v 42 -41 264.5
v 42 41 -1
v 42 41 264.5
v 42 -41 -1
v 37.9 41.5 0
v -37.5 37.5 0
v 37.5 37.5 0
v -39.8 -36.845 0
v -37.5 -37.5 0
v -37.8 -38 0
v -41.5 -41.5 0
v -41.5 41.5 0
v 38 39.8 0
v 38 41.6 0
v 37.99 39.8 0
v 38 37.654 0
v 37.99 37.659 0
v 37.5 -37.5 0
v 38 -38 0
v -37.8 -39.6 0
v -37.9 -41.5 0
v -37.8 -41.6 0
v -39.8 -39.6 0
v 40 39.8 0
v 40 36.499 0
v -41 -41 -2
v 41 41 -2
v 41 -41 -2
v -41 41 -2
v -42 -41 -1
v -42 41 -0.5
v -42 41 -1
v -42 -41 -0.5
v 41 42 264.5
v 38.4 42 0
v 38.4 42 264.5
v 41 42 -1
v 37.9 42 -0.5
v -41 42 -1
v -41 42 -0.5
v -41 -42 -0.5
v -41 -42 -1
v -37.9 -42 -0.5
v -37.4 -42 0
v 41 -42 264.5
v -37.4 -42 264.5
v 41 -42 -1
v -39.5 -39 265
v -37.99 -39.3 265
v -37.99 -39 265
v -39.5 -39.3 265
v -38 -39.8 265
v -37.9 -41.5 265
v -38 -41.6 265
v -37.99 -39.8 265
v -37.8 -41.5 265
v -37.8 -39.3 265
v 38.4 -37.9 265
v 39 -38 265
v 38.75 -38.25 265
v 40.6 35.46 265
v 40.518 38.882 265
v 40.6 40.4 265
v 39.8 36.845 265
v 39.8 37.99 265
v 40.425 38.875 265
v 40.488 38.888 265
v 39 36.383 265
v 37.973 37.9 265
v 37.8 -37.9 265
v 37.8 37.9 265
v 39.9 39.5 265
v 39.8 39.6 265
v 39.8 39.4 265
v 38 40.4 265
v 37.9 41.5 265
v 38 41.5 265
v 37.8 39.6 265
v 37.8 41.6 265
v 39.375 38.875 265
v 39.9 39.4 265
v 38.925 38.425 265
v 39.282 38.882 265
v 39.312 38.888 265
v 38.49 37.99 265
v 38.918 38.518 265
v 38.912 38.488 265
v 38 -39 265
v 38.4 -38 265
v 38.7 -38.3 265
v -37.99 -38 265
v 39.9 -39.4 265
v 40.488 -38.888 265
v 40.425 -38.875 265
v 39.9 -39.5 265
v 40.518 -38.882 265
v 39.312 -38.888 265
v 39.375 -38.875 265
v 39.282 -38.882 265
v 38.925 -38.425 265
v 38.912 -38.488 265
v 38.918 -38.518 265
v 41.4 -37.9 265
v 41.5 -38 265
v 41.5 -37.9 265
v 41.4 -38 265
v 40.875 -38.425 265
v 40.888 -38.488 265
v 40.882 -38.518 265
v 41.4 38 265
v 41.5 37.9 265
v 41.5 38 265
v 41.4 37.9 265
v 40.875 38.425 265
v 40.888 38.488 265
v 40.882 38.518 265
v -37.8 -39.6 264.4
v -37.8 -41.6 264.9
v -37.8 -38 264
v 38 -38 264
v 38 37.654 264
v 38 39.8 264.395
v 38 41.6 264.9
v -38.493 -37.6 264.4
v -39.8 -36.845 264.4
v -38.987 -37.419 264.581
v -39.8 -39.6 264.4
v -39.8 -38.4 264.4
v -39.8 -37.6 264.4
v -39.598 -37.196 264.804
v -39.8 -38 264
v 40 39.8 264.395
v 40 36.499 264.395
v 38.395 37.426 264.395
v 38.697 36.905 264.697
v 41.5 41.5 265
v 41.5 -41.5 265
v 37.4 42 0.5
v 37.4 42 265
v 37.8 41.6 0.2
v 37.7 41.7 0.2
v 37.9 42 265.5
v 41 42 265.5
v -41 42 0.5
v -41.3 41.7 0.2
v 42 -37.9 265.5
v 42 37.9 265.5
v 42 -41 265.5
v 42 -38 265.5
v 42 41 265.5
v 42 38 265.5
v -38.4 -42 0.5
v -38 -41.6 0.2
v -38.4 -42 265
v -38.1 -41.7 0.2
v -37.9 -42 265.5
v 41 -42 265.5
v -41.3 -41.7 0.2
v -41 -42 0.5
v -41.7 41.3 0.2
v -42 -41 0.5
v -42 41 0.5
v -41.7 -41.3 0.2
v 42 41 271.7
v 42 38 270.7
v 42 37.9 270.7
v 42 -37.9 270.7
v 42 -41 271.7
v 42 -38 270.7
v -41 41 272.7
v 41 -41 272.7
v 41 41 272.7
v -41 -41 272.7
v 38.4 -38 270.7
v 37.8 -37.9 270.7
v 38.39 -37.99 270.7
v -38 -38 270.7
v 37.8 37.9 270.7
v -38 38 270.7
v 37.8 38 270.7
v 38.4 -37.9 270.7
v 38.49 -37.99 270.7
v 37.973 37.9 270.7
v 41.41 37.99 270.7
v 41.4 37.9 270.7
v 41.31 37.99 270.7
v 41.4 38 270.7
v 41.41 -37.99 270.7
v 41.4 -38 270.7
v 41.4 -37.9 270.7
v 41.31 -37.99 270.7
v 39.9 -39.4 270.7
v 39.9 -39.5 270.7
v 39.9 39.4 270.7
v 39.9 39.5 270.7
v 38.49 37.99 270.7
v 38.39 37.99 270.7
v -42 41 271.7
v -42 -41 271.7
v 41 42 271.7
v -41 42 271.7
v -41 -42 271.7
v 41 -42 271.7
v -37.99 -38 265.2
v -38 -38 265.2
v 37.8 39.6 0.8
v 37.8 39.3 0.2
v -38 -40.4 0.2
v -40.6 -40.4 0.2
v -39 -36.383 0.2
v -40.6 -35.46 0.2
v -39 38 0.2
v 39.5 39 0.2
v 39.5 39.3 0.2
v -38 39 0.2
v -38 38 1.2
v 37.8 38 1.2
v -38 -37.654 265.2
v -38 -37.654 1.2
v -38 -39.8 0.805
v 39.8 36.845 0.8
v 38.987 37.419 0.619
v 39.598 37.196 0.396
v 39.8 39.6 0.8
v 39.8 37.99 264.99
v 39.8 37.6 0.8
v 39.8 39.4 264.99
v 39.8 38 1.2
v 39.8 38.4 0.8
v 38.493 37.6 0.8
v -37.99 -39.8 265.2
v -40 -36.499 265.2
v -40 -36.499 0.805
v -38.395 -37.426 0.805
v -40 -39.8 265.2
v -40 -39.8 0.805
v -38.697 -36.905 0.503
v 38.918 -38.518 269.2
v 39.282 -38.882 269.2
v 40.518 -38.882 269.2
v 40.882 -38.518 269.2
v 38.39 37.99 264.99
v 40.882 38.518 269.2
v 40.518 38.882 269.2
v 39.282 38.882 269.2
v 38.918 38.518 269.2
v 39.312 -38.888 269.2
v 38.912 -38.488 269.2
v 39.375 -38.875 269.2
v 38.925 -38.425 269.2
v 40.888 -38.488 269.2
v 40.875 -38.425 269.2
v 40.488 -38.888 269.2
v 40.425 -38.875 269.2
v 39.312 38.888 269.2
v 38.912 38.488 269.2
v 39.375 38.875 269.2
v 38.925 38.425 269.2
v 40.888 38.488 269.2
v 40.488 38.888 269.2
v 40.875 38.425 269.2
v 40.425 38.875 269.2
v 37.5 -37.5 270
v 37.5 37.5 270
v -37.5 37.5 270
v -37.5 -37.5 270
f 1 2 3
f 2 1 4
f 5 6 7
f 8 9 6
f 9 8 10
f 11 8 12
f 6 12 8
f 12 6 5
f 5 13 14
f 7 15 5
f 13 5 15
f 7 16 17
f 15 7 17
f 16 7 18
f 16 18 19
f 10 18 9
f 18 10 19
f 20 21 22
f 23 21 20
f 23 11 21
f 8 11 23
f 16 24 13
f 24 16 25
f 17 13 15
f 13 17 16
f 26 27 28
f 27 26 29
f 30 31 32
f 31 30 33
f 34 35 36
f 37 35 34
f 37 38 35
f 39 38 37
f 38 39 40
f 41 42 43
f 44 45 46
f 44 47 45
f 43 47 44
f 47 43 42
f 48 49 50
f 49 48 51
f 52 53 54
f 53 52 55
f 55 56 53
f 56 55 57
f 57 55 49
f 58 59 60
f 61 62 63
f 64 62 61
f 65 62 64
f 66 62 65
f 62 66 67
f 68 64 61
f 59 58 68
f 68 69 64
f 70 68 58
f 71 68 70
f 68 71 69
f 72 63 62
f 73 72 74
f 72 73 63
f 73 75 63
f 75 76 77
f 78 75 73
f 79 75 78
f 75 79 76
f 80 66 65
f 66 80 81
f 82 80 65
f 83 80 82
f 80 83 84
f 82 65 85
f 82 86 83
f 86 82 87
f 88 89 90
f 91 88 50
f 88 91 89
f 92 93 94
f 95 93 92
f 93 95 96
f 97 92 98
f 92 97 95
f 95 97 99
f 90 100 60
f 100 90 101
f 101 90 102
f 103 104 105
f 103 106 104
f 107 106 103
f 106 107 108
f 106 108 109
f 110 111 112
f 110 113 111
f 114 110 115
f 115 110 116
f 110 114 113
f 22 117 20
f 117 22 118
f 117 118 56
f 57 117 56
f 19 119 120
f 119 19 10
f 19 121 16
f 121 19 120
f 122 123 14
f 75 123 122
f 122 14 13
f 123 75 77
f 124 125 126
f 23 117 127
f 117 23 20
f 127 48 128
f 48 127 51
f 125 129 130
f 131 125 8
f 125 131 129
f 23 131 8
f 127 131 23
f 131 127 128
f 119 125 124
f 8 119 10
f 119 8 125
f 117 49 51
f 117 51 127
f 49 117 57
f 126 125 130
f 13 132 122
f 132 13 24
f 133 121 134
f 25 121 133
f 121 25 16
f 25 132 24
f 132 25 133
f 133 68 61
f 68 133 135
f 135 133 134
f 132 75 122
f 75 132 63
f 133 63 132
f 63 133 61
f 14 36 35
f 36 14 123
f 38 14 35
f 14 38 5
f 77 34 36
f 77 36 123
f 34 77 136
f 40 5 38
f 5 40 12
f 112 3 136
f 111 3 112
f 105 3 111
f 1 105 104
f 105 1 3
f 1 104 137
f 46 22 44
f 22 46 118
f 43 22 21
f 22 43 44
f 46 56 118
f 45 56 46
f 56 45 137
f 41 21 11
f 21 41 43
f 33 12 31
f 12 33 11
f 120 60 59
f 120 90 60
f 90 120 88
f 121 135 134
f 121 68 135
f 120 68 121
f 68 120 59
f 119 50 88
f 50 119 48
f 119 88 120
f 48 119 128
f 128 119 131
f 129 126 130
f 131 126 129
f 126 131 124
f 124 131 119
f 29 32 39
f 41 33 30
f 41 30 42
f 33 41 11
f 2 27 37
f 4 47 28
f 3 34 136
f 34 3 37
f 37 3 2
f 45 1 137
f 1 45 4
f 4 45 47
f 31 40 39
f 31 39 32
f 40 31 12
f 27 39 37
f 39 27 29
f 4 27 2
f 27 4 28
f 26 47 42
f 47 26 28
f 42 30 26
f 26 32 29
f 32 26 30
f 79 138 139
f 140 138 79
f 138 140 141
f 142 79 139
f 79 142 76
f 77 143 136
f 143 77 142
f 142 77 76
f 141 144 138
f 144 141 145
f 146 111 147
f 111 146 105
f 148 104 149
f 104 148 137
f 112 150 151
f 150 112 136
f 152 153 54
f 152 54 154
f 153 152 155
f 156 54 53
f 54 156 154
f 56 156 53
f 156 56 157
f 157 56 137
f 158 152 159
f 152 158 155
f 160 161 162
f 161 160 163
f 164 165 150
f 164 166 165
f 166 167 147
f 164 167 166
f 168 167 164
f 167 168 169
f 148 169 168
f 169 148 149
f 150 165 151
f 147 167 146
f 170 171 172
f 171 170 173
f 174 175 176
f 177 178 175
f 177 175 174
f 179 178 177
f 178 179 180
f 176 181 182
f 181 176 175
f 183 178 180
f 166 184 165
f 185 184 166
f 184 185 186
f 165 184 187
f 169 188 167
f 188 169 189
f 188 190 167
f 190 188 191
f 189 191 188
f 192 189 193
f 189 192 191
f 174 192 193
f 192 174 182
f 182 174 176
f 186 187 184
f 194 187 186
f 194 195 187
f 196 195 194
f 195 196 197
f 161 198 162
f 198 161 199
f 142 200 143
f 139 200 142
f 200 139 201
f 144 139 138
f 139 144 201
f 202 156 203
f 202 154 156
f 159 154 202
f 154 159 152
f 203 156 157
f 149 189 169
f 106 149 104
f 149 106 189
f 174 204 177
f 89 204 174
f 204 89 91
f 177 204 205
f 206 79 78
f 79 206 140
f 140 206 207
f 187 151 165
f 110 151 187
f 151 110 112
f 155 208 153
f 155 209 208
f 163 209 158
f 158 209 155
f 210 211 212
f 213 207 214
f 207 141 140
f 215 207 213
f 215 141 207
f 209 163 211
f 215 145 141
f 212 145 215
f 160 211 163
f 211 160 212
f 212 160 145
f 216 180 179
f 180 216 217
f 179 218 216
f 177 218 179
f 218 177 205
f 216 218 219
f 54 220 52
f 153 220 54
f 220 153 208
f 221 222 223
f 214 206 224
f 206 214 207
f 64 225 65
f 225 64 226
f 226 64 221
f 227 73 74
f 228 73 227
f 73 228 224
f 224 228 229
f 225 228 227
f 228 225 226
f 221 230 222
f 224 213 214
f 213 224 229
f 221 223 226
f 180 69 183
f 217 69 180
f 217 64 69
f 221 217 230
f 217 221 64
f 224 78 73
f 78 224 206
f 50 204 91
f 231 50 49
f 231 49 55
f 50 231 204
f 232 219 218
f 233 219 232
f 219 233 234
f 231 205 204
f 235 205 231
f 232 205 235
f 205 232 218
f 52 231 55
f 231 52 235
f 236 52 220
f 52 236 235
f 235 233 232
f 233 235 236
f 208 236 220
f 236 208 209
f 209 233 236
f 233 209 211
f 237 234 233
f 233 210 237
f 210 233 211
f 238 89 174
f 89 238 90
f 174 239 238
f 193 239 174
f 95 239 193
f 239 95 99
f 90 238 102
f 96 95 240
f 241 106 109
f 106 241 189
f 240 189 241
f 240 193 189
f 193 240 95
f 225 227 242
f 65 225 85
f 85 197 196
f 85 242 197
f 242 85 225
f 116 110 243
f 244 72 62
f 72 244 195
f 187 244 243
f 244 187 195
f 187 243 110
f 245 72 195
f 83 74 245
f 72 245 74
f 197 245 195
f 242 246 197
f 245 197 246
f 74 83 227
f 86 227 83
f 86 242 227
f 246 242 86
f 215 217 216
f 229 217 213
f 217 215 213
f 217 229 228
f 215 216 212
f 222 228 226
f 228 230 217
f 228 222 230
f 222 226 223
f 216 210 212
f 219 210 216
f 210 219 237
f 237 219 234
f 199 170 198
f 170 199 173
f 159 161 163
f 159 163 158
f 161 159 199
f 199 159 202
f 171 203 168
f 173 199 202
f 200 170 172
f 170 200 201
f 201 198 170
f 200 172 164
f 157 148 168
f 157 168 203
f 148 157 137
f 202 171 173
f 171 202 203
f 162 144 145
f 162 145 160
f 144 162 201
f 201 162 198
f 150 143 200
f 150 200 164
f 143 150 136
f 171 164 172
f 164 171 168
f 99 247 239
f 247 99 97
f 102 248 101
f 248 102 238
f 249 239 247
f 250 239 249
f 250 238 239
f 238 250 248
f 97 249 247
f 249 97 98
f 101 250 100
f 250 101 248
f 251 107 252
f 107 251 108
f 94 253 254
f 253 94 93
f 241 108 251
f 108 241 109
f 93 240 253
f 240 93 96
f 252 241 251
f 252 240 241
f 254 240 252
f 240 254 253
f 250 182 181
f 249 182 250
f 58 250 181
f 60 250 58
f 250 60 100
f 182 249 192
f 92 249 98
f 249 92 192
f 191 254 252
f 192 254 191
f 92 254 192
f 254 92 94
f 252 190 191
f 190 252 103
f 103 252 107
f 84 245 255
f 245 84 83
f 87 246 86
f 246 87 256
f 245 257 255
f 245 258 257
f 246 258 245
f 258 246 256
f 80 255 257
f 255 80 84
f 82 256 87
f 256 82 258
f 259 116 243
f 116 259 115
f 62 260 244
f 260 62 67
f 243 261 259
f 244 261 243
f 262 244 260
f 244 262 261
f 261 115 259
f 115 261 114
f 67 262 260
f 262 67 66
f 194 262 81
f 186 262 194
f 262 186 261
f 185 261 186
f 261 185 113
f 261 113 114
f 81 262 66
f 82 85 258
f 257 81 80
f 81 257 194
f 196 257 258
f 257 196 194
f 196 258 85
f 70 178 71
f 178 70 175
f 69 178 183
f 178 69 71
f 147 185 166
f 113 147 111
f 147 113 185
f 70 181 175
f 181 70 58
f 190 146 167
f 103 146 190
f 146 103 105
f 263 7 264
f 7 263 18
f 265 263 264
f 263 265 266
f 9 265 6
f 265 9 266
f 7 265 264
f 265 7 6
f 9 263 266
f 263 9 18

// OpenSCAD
// Jenga box in two three-sided halves. The stacker is the back and right walls
// plus an end cap, a little shorter than the tower. Cap up, it squares the
// tower in its back-right corner and slides off. Cap down, it holds the blocks,
// and the lid (front and left walls plus the other end cap) slides down onto
// it. A lip on the lid's back and right edges covers the rest of the tower.
// The right one is a strip of its own, glued in: slide it up from below, its
// pointed ends in the lid's notches, until it meets the cap, then run thin CA
// along it inside.
//
// The halves slide on two dovetail seams, each a 180° turn of the other: a
// groove in one half's wall, and a tongue on the edge of the other half's.
// A store-bought draw latch will hold the lid down, across the seam under the
// lip; its screw holes are still to come.
//
// Storage orientation: x is right, y is toward the front, z is up. The tower
// stands on the stacker's cap at z = 0.
//
// Print the stacker on its right side and the lid on its left, each at 45° to
// fit the bed diagonally. Both grooves are then in a wall on the bed and face
// up, and both tongues are the top edge of a standing wall: nothing in the
// joint overhangs. The lip strip, which would be a bridge at the top of the
// lid, lies beside it, outside face down.
//
// "joint" is a test to print first: lengths of groove and of tongue at the
// clearances in joint_clears, printed as their walls are in the box.

// export: stacker lid joint
// orca: brim_type=outer_only brim_width=5

/* [Output] */
part = "assembly"; // [assembly, stack, stacker, lid, joint]
// Lid height above closed, in the assembly view.
lid_raise = 0;

/* [Tower] */
// Measure your own tower; sets vary.
tower_w = 75;
tower_h = 270;
// Per side.
tower_clear = 0.5;
// How much shorter the stacker's walls are than the tower. The lid's lip
// makes up the rest.
stacker_short = 5;

/* [Walls] */
wall = 4;
cap_t = 2;
// Each tongue rides in a dovetail groove in the other half's wall.
tongue_t = 1.6;
groove_depth = 2;
// Undercut angle on the groove's inner side.
dovetail = 30;

/* [Edges] */
// Outer edges, and the inner edges at each half's open end.
chamfer = 1;
// V-groove along the outside seams between the halves.
reveal = 0.5;

/* [Fit] */
slide_clear = 0.2;
// Chamfer on the tongue tips and groove mouths.
lead_in = 0.6;
// Gap under the lid's walls, so that it's the seam under the lip that closes.
seat_gap = 0.2;

/* [Lip strip] */
// How far each pointed end reaches into its notch.
lip_key = 1.5;
// Clearance at each end.
lip_c = 0.1;
// How far the crush ribs on the ends' flanks bite.
lip_crush = 0.1;

/* [Tests] */
joint_clears = [0.15, 0.2, 0.3];
joint_len = 40;

/* [Hidden] */
$fn = 48;

eps = 0.01;
c = slide_clear;
tb = tongue_t;
gd = groove_depth;
li = lead_in;
t_dv = tan(dovetail);

iw = tower_w + 2 * tower_clear;
ih = tower_h + tower_clear;
h = iw / 2;
o = h + wall;
z_s = tower_h - stacker_short;
// Underside of the lid's cap.
z_a = ih + c;
z_top = z_a + cap_t;
// Bottom of the lid's walls.
z_l = seat_gap;

assert(tb + c + li < wall && gd + li < wall, "tongue_t, groove_depth or lead_in too big for wall");

module box(x, y, z) {
  translate([x[0], y[0], z[0]]) cube([x[1] - x[0], y[1] - y[0], z[1] - z[0]]);
}

// Seam profiles: u runs into the groove from its wall's inner face, s across
// it, with the dovetail side negative. The tongue's dovetail side runs from
// its wall's corner at u = -c; the groove's is c from it.
function tongue_s(u, c) = -(u + c) * t_dv;
function groove_s(u, c) = tongue_s(u, c) - c / cos(dovetail);
function groove_pts(c) = [[-eps, groove_s(-eps, c)], [gd, groove_s(gd, c)], [gd, tb + c], [-eps, tb + c]];
// Buried in its wall behind u = -c.
function tongue_pts(c) = [[-c - 1, tongue_s(-c - 1, c)], [gd - c, tongue_s(gd - c, c)], [gd - c, tb], [-c - 1, tb]];

// Seam 0 is front-right: the groove in the stacker's right wall, the tongue on
// the lid's front wall. Seam 1 is back-left: the groove in the lid's left
// wall, the tongue on the stacker's back wall.
module at_seam(i) {
  rotate(180 * i) translate([h, h, 0]) children();
}

// From z0 to z1, flared to a lead-in at its mouth: the top, or the bottom.
module groove(z0, z1, mouth_up, c = c) {
  m = mouth_up ? z1 : z0;
  d = mouth_up ? 1 : -1;
  translate([0, 0, z0]) linear_extrude(z1 - z0) polygon(groove_pts(c));
  hull() {
    translate([0, 0, m - d * li]) linear_extrude(eps, center = true) polygon(groove_pts(c));
    translate([0, 0, m + d / 2]) linear_extrude(1, center = true) offset(delta = li) polygon(groove_pts(c));
  }
}

// From z0 to z1, narrowed to a lead-in at its leading end: the top, or the
// bottom.
module tongue(z0, z1, lead_up, c = c) {
  hull() {
    translate([0, 0, lead_up ? z0 : z0 + li]) linear_extrude(z1 - z0 - li) polygon(tongue_pts(c));
    translate([0, 0, lead_up ? z1 - eps : z0]) linear_extrude(eps) offset(delta = -li / 2) polygon(tongue_pts(c));
  }
}

// The closed box's outside, chamfered on every edge.
module envelope() {
  hull() {
    box([-o + chamfer, o - chamfer], [-o + chamfer, o - chamfer], [-cap_t, z_top]);
    box([-o, o], [-o + chamfer, o - chamfer],
        [-cap_t + chamfer, z_top - chamfer]);
    box([-o + chamfer, o - chamfer], [-o, o],
        [-cap_t + chamfer, z_top - chamfer]);
  }
}

// Cuts a 45° chamfer of size r into the edges along a -> b, with pyramid ends
// so that cuts meeting at a corner join cleanly.
module edge_cut(a, b, r) {
  hull() for (p = [a, b]) translate(p)
    polyhedron([[r, 0, 0], [-r, 0, 0], [0, r, 0], [0, -r, 0], [0, 0, r],
                [0, 0, -r]],
               [[0, 2, 4], [2, 1, 4], [1, 3, 4], [3, 0, 4], [2, 0, 5], [1, 2, 5],
                [3, 1, 5], [0, 3, 5]]);
}

// Along every outside seam.
module reveals() {
  f = h - c / 2;
  for (e = [// Front: up the right wall's end, over it, and under the front wall.
            [[f, o, 0], [f, o, z_s]], [[f, o, z_s], [o, o, z_s]], [[-o, o, 0], [f, o, 0]],
            // Right: under the lip.
            [[o, -o, z_s], [o, o, z_s]],
            // Back: up the left wall's end, under the lip, and under the left wall.
            [[-f, -o, 0], [-f, -o, z_s]], [[-f, -o, z_s], [o, -o, z_s]], [[-o, -o, 0], [-f, -o, 0]],
            // Left: under the left wall.
            [[-o, -o, 0], [-o, o, 0]]])
    edge_cut(e[0], e[1], reveal);
}

module stacker() {
  intersection() {
    envelope();
    difference() {
      union() {
        box([-o, o], [-o, o], [-cap_t, 0]);
        box([-h + c, o], [-o, -h], [-cap_t, z_s]);
        box([h, o], [-o, o], [-cap_t, z_s]);
        at_seam(1) tongue(-eps, z_s, true);
      }
      at_seam(0) groove(0, z_s, true);
      reveals();
      // Inner top edges of the right and back walls.
      edge_cut([h, -h, z_s], [h, h, z_s], chamfer);
      edge_cut([-h - gd, -h, z_s], [h, -h, z_s], chamfer);
    }
  }
}

module lid() {
  intersection() {
    envelope();
    difference() {
      union() {
        box([-o, o], [-o, o], [z_a, z_top]);
        // Lip over the stacker's back and right walls.
        box([-o, o], [-o, -h], [z_s, z_top]);
        box([h - c, o], [h, o], [z_s, z_top]);
        // Front and left walls.
        box([-o, h - c], [h, o], [z_l, z_top]);
        box([-o, -h], [-o, o], [z_l, z_top]);
        at_seam(0) tongue(z_l, z_top, false);
      }
      at_seam(1) groove(z_l, z_s + c, false);
      for (sy = [-1, 1]) lip_key(sy, z_s - eps);
      reveals();
      // Inner bottom edges of the front wall and its tongue, and of the left
      // wall.
      edge_cut([-h, h, z_l], [h + gd - c, h, z_l], chamfer);
      edge_cut([-h, -h, z_l], [-h, h, z_l], chamfer);
    }
  }
}

// A pointed end of the lip strip, at the back (sy = -1) or the front (1), from
// z0 up to the cap: a 45° point, so it prints in the strip and its notch in
// the lid.
module lip_key(sy, z0) {
  xm = (h - c + o) / 2;
  translate([xm, sy * h, z0]) linear_extrude(z_a - z0)
    polygon([[-lip_key - eps, -sy * eps], [0, sy * lip_key], [lip_key + eps, -sy * eps]]);
}

// The lip over the stacker's right wall. Ribs along each end's flanks crush
// into the notches and center it; they stop short of the top, to start it.
module lip_strip() {
  r = 0.4;
  // A flank's gap to its notch, square to it.
  gap = lip_c / sqrt(2);
  intersection() {
    envelope();
    difference() {
      union() {
        box([h - c, o], [-h + lip_c, h - lip_c], [z_s, z_a]);
        for (sy = [-1, 1]) translate([0, -sy * lip_c, 0]) {
          lip_key(sy, z_s);
          for (sx = [-1, 1])
            translate([(h - c + o) / 2 + sx * lip_key / 2, sy * (h + lip_key / 2), z_s])
              translate([sx, sy] * (gap + lip_crush - r) / sqrt(2)) cylinder(r = r, h = z_a - z_s - 1.5, $fn = 16);
        }
      }
      reveals();
    }
  }
}

module tower() {
  box([-tower_w / 2, tower_w / 2], [-tower_w / 2, tower_w / 2], [0, tower_h]);
}

/* Tests */

// A row of d = 2 notches, i + 1 of them, to tell the coupons apart.
module notches(i, len) {
  for (n = [0 : i]) translate([0, 0, 5 + 3.5 * n]) rotate([-90, 0, 0]) cylinder(d = 2, h = len, center = true);
}

// Coupon i's length of grooved wall, outside face on the bed, and beside it
// its length of tongued wall, standing.
module joint_test() {
  back = 12;
  for (i = [0 : len(joint_clears) - 1]) translate([0, i * (back + wall + 5), 0]) {
    jc = joint_clears[i];
    translate([0, 0, wall]) rotate([0, 90, 0]) difference() {
      box([0, wall], [-back, wall], [0, joint_len]);
      groove(-1, joint_len, true, jc);
      translate([wall, -back, 0]) notches(i, 2 * wall);
    }
    translate([-5, 0, back]) rotate([0, -90, 0]) translate([jc, 0, 0]) difference() {
      union() {
        box([-jc - back, -jc], [0, wall], [0, joint_len]);
        tongue(0, joint_len, false, jc);
      }
      translate([-jc - back, 0, 0]) notches(i, 3 * wall);
    }
  }
}

if (part == "stacker") {
  color("white") rotate([0, 0, 45]) translate([0, 0, o]) rotate([0, 90, 0]) stacker();
} else if (part == "lid") {
  color("white") rotate([0, 0, 45]) translate([0, 0, o]) rotate([0, -90, 0]) lid();
  // Along the lid, clear of its brim.
  color("white") rotate([0, 0, 45]) translate([-z_a / 2, 55 - z_s, o]) rotate([0, 0, 90]) rotate([0, 90, 0]) lip_strip();
} else if (part == "joint") {
  color("white") joint_test();
} else if (part == "stack") {
  // Cap up, resting on the tower.
  color("white") translate([0, 0, tower_h]) rotate([0, 180, 0]) stacker();
  color("burlywood", 0.4) tower();
} else {
  color("white") stacker();
  translate([0, 0, lid_raise]) {
    color("lightgray") lid();
    color("gainsboro") lip_strip();
  }
  color("burlywood", 0.4) tower();
}
